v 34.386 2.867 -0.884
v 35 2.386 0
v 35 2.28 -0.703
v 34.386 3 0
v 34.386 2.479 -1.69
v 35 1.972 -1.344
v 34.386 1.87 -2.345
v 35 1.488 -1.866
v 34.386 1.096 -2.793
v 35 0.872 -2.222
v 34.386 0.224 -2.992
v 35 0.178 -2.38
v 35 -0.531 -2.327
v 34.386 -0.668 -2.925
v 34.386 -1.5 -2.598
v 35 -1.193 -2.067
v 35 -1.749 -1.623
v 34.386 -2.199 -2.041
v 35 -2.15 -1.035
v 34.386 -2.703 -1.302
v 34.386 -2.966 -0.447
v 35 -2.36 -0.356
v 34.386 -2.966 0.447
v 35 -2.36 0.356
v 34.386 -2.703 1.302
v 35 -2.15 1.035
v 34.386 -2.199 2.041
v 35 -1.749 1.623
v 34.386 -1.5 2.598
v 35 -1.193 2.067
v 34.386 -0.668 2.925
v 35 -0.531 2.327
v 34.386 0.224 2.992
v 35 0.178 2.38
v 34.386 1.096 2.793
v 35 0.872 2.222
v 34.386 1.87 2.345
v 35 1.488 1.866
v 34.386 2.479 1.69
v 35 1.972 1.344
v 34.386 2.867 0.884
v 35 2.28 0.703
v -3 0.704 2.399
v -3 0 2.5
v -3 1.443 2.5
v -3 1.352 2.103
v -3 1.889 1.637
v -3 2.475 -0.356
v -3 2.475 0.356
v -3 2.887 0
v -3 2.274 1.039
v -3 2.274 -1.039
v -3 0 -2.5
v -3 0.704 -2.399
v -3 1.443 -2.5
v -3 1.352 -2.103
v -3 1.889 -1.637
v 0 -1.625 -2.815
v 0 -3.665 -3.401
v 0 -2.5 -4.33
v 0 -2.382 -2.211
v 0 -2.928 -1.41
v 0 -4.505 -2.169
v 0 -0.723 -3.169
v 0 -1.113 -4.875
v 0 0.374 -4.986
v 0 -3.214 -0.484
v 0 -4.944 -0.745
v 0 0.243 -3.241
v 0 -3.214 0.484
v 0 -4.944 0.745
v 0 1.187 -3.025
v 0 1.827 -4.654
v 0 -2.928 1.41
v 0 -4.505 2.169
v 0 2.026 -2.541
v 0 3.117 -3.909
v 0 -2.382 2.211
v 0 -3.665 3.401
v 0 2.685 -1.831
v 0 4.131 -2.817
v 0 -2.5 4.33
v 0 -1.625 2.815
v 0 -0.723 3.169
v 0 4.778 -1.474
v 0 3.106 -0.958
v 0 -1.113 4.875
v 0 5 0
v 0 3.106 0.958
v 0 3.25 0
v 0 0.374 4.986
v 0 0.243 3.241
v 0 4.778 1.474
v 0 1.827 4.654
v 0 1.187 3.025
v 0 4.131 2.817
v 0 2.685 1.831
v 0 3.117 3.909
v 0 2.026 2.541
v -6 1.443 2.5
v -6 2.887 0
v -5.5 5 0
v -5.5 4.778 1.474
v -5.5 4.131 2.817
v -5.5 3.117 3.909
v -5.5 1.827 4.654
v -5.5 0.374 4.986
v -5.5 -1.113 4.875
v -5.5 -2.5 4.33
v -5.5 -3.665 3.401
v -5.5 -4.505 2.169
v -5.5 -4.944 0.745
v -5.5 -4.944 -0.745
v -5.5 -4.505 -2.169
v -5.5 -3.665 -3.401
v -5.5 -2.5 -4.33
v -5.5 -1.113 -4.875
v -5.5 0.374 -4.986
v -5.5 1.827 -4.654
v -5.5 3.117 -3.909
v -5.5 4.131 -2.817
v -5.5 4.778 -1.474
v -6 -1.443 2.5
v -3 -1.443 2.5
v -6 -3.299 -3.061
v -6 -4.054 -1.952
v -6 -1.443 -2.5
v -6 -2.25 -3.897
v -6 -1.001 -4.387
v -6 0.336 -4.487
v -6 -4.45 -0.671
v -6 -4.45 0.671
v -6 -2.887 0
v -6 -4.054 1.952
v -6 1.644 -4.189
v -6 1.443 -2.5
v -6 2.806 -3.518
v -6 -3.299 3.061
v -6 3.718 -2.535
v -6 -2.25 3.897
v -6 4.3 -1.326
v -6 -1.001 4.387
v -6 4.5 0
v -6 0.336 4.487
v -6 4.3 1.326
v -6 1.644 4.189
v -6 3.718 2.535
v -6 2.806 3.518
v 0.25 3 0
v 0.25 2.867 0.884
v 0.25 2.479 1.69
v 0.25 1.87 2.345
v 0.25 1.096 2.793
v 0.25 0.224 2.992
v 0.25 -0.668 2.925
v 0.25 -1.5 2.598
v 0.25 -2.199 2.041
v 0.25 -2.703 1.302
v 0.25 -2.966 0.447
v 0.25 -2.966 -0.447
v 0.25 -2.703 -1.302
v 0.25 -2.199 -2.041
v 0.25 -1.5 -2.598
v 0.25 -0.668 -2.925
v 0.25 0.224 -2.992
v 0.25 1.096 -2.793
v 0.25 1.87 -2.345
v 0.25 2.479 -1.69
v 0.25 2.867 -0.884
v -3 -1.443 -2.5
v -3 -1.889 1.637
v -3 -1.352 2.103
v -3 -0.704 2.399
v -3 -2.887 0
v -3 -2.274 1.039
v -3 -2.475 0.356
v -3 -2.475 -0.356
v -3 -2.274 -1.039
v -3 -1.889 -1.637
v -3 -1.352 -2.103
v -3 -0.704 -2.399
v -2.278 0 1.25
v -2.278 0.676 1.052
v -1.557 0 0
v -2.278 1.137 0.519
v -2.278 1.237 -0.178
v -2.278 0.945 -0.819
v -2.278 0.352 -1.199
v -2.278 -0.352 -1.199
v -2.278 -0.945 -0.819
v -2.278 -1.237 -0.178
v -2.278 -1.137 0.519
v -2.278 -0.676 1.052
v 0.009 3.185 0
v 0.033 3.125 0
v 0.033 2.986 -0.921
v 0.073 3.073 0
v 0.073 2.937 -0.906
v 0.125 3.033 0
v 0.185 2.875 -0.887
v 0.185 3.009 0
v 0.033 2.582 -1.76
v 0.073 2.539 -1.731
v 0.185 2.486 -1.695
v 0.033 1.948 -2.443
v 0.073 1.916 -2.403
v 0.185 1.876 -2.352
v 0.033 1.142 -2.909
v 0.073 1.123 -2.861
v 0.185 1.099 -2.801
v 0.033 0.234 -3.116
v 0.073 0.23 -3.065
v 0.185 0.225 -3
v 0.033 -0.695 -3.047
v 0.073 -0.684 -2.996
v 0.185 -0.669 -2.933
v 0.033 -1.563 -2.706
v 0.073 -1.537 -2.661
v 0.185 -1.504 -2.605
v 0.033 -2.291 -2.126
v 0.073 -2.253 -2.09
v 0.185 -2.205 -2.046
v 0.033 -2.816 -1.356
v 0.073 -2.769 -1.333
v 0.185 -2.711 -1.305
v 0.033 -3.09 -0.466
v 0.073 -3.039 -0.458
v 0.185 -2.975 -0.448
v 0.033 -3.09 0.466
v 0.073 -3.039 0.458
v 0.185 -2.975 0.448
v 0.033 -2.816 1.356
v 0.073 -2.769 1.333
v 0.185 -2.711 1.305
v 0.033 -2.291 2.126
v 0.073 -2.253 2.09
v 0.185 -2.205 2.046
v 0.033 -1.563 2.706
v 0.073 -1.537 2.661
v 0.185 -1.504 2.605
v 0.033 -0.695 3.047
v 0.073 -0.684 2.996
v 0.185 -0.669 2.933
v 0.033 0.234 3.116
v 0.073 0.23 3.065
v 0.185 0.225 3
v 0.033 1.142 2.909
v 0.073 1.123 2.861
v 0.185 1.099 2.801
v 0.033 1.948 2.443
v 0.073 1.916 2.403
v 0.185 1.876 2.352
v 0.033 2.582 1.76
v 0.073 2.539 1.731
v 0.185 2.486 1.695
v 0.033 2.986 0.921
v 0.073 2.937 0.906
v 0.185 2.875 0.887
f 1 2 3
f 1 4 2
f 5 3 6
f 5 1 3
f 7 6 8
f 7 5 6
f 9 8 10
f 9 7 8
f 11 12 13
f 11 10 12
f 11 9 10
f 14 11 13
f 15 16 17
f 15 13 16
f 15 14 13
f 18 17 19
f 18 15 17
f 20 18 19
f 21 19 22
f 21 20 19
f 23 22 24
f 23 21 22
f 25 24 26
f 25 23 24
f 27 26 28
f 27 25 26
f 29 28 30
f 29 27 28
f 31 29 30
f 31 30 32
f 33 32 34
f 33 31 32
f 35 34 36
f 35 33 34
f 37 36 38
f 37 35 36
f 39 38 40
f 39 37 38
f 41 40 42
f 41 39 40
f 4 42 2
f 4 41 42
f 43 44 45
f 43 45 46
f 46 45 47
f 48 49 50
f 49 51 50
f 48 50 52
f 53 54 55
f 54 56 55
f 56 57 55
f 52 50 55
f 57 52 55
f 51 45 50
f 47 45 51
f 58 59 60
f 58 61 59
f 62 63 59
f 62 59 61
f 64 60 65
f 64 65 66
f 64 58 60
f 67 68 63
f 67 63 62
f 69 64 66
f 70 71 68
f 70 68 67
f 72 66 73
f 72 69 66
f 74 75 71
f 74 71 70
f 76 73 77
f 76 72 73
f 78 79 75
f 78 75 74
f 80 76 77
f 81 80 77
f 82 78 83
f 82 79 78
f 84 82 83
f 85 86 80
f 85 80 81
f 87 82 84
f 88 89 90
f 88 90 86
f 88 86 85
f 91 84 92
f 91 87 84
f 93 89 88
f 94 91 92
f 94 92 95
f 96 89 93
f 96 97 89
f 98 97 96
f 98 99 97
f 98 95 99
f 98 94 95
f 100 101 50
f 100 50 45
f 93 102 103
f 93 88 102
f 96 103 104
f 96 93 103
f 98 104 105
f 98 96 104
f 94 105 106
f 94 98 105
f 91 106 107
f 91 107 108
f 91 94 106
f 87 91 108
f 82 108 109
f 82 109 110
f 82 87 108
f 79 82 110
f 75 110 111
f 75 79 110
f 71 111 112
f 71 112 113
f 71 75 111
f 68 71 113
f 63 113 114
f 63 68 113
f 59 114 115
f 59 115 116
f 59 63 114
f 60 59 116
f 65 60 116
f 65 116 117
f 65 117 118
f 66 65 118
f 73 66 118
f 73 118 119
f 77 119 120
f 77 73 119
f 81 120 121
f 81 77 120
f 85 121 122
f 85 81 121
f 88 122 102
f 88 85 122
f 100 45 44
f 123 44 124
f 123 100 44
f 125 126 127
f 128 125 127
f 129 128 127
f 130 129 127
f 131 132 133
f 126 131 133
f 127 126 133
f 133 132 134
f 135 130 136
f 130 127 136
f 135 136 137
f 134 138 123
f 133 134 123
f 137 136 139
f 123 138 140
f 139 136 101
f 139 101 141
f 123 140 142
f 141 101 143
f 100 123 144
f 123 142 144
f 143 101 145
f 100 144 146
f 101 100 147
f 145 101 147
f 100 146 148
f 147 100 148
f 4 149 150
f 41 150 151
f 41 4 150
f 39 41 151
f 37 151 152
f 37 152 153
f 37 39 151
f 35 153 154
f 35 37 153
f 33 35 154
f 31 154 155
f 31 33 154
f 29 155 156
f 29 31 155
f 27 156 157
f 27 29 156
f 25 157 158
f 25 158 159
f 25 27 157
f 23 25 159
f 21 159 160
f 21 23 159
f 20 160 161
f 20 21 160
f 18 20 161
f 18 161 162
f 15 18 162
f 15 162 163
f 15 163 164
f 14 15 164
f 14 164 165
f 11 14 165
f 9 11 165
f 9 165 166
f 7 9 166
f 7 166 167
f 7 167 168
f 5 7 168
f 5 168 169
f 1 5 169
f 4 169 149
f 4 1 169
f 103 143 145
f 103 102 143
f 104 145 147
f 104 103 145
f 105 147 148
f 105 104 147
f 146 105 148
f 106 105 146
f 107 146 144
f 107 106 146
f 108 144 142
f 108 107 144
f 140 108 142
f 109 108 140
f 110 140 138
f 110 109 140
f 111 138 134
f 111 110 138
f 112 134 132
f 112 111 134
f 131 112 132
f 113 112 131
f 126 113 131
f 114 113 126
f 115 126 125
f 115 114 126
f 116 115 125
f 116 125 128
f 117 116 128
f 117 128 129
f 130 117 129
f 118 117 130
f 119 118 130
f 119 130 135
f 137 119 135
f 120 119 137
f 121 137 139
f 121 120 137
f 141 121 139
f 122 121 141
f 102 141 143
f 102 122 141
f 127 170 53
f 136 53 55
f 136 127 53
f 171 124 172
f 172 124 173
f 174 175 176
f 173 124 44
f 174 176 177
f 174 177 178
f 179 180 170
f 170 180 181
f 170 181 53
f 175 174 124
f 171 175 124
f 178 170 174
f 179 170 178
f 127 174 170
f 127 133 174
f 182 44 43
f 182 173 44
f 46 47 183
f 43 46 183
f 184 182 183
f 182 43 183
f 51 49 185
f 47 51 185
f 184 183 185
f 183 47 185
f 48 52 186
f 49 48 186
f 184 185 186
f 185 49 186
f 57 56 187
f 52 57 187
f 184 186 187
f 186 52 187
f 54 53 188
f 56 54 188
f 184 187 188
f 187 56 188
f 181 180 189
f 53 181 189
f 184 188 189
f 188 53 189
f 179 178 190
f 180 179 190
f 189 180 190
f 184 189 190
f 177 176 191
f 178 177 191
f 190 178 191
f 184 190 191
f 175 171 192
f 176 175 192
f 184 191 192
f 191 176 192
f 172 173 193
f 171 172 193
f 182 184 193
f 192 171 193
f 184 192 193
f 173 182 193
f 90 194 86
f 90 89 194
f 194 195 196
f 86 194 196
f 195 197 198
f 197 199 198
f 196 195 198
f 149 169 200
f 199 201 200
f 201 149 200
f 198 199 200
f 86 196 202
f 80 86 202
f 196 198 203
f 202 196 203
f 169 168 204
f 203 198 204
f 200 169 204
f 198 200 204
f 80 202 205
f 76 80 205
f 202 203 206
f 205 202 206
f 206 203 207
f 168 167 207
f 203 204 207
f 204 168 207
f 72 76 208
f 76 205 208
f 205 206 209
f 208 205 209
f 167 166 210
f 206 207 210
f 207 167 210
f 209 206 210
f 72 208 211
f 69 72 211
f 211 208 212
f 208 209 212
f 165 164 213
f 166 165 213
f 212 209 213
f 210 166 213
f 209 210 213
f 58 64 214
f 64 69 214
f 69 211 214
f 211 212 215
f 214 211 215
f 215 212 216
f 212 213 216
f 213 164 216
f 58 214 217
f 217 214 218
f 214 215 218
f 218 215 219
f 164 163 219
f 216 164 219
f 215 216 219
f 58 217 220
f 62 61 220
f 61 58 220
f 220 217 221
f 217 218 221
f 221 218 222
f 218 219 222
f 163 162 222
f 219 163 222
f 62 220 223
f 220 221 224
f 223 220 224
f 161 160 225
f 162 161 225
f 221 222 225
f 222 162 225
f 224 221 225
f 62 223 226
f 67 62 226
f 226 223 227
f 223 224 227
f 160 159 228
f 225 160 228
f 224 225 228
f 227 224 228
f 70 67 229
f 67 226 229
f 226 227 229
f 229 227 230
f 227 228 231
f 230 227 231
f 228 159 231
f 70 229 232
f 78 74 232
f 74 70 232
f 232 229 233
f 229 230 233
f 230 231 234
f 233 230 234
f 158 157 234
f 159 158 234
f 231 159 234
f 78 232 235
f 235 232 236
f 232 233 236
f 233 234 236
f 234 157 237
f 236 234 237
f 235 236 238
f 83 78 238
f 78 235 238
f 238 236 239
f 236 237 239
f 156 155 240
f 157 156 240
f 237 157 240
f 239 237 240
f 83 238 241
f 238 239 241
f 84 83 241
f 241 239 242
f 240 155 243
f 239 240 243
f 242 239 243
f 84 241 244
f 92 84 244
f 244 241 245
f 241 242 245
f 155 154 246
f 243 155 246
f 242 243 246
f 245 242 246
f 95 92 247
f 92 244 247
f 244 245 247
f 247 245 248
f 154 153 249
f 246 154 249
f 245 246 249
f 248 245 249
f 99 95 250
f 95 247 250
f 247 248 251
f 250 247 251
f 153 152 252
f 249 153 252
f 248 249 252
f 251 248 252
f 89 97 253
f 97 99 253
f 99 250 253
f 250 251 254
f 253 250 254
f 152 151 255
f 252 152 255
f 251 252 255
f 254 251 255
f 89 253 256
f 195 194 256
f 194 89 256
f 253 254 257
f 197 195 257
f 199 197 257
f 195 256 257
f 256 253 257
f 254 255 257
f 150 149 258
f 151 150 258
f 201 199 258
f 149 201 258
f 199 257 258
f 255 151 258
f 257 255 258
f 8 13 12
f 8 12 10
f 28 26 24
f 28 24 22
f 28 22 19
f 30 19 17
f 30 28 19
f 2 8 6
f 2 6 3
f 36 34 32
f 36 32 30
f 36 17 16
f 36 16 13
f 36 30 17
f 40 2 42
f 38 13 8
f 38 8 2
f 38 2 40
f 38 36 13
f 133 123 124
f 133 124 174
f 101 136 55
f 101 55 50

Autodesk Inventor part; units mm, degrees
sketch "Sketch_8" plane through (0, 0, 0) normal (0, 0, 1) x (1, 0, 0)
  line L0 (35, 0) -> (-6, 0)
  line L1 (-6, 0) -> (-6, 4.5)
  line L2 (-6, 4.5) -> (-5.5, 5)
  line L3 (-5.5, 5) -> (0, 5)
  line L4 (0, 5) -> (0, 3.25)
  arc A0 (0, 3.25) -> (0.25, 3) centre (0.25, 3.25) ccw
  line L5 (0.25, 3) -> (34.3865, 3)
  line L6 (34.3865, 3) -> (35, 2.3865)
  line L7 (35, 2.3865) -> (35, 0)
  line L8 (35, 0) -> (-6, 0)
revolve "Revolution1" add sketch "Sketch_8" angle 360 about axis through (35, 0, 0) along (1, 0, 0)
thread "Thread1" size "M6x1" class "6g" standard "ISO Metric profile" length 23.3865
sketch "Sketch2" plane through (-6, 0, 0) normal (-1, 0, 0) x (0, 0, 1)
  point P0 (0, 0)
hole "Hole1" at (-6, 0, 0) direction (1, 0, 0) diameter 5 depth 3 tip angle 120
sketch "Sketch_3" plane through (-6, 0, 0) normal (1, 0, 0) x (0, 0, -1)
  line L0 (-2.5, -1.4434) -> (0, -2.8868)
  line L1 (0, -2.8868) -> (2.5, -1.4434)
  line L2 (2.5, -1.4434) -> (2.5, 1.4434)
  line L3 (2.5, 1.4434) -> (0, 2.8868)
  line L4 (0, 2.8868) -> (-2.5, 1.4434)
  line L5 (-2.5, 1.4434) -> (-2.5, -1.4434)
extrude "Extrusion1" cut sketch "Sketch_3" along normal blind 3
ref_plane "bolt_XY" through (0, 0, 0) normal (1, 0, 0) x (0, 0, -1)
ref_plane "bolt_YZ" through (0, 0, 0) normal (0, 0, -1) x (0, 1, 0)
ref_plane "bolt_ZX" through (0, 0, 0) normal (0, 1, 0) x (1, 0, 0)
ref_plane "nut_XY" through (35, 0, 0) normal (1, 0, 0) x (0, 0, -1)
ref_plane "nut_YZ" through (35, 0, 0) normal (0, 0, -1) x (0, 1, 0)
ref_plane "nut_ZX" through (35, 0, 0) normal (0, 1, 0) x (1, 0, 0)
properties part number "CBM6-35"
